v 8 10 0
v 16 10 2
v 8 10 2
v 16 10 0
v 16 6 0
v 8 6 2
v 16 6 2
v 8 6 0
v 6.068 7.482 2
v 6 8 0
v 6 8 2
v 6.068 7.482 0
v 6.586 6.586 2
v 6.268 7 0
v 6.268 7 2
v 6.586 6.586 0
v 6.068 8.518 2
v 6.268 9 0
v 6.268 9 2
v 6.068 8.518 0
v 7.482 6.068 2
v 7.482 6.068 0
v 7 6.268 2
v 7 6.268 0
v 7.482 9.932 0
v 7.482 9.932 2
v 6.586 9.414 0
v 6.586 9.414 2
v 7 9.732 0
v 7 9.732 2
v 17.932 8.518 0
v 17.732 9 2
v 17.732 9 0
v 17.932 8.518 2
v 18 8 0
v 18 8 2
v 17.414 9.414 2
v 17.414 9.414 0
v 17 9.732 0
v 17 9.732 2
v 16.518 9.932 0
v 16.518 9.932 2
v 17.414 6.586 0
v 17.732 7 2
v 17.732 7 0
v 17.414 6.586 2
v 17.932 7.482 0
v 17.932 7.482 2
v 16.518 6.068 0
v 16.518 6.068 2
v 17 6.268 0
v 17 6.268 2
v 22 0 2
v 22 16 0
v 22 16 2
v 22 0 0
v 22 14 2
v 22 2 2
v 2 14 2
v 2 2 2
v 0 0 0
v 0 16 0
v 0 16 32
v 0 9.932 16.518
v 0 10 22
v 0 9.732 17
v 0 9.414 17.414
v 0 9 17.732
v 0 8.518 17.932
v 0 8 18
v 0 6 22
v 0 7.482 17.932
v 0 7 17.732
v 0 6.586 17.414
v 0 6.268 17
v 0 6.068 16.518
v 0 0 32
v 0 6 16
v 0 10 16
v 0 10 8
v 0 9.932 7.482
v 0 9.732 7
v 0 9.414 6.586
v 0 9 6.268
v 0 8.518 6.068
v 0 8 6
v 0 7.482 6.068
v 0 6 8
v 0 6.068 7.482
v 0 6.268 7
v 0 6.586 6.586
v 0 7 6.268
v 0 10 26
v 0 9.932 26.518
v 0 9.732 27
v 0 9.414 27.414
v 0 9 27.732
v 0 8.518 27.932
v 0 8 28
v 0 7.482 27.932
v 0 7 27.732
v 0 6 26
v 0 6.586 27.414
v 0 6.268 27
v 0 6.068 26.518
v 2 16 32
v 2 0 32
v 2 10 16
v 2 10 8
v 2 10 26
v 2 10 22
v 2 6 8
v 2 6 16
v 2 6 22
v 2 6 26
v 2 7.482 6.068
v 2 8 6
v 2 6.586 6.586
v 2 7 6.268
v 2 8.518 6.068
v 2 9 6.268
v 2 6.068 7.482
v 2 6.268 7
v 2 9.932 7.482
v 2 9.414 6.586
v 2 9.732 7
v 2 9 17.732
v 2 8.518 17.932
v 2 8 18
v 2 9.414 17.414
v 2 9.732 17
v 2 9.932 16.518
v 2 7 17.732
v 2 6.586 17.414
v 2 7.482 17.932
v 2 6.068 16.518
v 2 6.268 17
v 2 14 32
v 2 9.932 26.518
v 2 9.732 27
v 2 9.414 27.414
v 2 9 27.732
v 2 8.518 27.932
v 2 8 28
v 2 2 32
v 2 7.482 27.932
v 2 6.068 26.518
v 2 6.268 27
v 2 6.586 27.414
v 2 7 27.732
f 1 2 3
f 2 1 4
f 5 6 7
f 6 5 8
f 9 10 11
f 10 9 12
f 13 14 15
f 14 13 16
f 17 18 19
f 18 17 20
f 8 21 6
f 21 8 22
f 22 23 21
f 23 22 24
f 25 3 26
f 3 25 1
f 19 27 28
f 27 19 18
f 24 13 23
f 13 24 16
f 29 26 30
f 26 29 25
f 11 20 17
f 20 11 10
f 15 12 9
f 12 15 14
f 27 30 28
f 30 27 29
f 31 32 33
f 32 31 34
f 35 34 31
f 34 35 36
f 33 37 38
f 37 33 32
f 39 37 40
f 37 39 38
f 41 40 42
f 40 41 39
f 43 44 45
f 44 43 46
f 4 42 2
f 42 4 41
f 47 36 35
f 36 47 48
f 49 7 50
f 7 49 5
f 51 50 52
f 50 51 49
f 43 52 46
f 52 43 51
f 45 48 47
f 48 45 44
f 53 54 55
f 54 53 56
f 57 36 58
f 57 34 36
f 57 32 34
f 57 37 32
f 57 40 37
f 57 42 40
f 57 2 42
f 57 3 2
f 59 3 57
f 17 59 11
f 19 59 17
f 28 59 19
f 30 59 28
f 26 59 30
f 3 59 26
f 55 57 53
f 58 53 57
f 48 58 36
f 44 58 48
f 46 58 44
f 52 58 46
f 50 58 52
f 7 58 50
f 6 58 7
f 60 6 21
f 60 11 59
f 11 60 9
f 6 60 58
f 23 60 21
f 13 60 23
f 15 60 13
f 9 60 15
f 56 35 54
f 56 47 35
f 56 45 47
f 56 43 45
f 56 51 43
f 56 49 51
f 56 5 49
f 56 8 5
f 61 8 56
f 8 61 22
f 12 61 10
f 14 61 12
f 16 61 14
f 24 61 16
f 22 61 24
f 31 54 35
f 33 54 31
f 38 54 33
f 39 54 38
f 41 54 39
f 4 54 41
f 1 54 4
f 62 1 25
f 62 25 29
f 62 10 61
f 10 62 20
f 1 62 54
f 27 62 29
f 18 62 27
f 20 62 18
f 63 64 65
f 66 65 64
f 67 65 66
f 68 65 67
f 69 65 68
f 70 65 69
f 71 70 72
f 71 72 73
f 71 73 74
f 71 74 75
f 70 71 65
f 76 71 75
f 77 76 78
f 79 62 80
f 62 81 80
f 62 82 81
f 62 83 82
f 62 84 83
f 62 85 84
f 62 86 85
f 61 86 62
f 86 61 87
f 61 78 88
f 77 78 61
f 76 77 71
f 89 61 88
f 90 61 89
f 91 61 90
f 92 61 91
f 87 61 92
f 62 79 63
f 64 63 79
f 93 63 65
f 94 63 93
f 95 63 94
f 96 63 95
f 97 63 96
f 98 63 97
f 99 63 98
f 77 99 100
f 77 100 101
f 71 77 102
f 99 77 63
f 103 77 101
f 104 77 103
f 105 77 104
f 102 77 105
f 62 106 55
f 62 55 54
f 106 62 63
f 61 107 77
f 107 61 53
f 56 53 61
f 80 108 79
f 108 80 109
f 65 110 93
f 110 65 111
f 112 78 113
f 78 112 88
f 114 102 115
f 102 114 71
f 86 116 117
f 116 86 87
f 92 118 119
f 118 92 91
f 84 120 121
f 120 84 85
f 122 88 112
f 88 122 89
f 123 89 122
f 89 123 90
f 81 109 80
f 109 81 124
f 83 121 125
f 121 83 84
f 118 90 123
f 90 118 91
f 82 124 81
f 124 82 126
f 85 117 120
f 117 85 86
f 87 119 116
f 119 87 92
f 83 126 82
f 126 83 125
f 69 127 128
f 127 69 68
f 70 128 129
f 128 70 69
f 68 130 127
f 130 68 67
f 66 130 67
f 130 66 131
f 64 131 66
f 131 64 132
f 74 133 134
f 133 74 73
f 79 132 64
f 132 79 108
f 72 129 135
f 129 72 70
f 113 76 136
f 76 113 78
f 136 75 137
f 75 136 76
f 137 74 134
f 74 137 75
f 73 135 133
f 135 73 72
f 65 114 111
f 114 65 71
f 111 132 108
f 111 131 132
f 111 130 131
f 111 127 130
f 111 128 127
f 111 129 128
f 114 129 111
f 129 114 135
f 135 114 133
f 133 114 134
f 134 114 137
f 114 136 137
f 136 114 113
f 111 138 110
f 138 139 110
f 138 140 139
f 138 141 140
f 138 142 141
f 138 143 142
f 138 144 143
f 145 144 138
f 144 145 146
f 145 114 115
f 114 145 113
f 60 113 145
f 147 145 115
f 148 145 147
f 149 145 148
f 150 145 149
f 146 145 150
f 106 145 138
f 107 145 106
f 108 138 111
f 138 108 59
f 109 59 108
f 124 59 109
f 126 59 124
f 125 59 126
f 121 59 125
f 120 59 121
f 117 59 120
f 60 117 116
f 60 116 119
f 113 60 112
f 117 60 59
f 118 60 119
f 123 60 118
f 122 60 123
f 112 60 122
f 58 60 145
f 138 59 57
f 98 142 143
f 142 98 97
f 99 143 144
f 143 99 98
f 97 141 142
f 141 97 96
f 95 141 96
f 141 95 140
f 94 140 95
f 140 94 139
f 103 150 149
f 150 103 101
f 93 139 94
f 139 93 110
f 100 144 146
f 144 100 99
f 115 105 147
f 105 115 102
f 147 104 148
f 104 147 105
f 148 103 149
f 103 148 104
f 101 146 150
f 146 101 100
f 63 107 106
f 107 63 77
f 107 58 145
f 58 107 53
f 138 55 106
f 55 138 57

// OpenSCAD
// [FL_INDEX: keywords="openscad, 3d_parametric, Parametric_L-Bracket, csg_solid" | COT="Parametric OpenSCAD design from 3DCodeverse"]
// Title: Parametric L-Bracket

// ===== file: l-bracket.scad =====
// l-bracket.scad
//
// generates an l-bracket from the given parameters


// Copyright (c) 2015, Patrick Barrett
// All rights reserved.
//
// Redistribution and use in source and binary forms, with or without
// modification, are permitted provided that the following conditions are met:
//
// 1. Redistributions of source code must retain the above copyright notice,
// this list of conditions and the following disclaimer.
//
// 2. Redistributions in binary form must reproduce the above copyright notice,
// this list of conditions and the following disclaimer in the documentation
// and/or other materials provided with the distribution.
//
// THIS SOFTWARE IS PROVIDED BY THE COPYRIGHT HOLDERS AND CONTRIBUTORS "AS IS"
// AND ANY EXPRESS OR IMPLIED WARRANTIES, INCLUDING, BUT NOT LIMITED TO, THE
// IMPLIED WARRANTIES OF MERCHANTABILITY AND FITNESS FOR A PARTICULAR PURPOSE
// ARE DISCLAIMED. IN NO EVENT SHALL THE COPYRIGHT HOLDER OR CONTRIBUTORS BE
// LIABLE FOR ANY DIRECT, INDIRECT, INCIDENTAL, SPECIAL, EXEMPLARY, OR
// CONSEQUENTIAL DAMAGES (INCLUDING, BUT NOT LIMITED TO, PROCUREMENT OF
// SUBSTITUTE GOODS OR SERVICES; LOSS OF USE, DATA, OR PROFITS; OR BUSINESS
// INTERRUPTION) HOWEVER CAUSED AND ON ANY THEORY OF LIABILITY, WHETHER IN
// CONTRACT, STRICT LIABILITY, OR TORT (INCLUDING NEGLIGENCE OR OTHERWISE)
// ARISING IN ANY WAY OUT OF THE USE OF THIS SOFTWARE, EVEN IF ADVISED OF THE
// POSSIBILITY OF SUCH DAMAGE.

wall_thickness = 2;
internal_width = 12;
slot_width = 4;
side_length = 20;

// customizable variables end here

head_annulus = (internal_width/2) - (slot_width/2);

abit = 0.0001 * 1; //use for making overlap to get single manifold stl

module stadium3d(a, r, z, center = false){
	offset_x = center ? -(r + (a / 2)) : 0;
	offset_y = center ? -(r) : 0;
	offset_z = center ? -(z / 2) : 0;

	translate([offset_x, offset_y, offset_z])
	union() {
		translate([r, 0, 0])
			cube([a, 2*r, z]);
		translate([r, r, 0])
			cylinder(h = z, r = r, center = false);
		translate([r + a, r, 0])
			cylinder(h = z, r = r);
	}
}

union() {
	// horizontal wall
	difference() {
		cube([side_length + wall_thickness,
		      internal_width + 2*wall_thickness,
		      wall_thickness]);
		translate([wall_thickness + head_annulus,
		           wall_thickness + head_annulus,
		           -1])
			stadium3d(side_length - (2*head_annulus) - slot_width,
 			          slot_width / 2,
 			          wall_thickness + 2);
	}

	// verticle wall
	translate([wall_thickness, 0, 0])
	rotate([0,-90,0])
	difference() {
		cube([side_length + wall_thickness,
		      internal_width + 2*wall_thickness,
		      wall_thickness]);
		translate([wall_thickness + head_annulus,
		           wall_thickness + head_annulus,
		           -1])
			stadium3d(side_length - (2*head_annulus) - slot_width,
 			          slot_width / 2,
 			          wall_thickness + 2);
	}

	// bracer 1
	translate([wall_thickness - abit,
	           wall_thickness,
	           wall_thickness - abit])
	rotate([90,0,0])
	linear_extrude(height = wall_thickness) {
		polygon([[0,0],
		        [side_length,0],
		        [0,side_length]]);
	}

	// bracer 2
	translate([wall_thickness - abit,
	           2*wall_thickness + internal_width,
	           wall_thickness - abit])
	rotate([90,0,0])
	linear_extrude(height = wall_thickness) {
		polygon([[0,0],
		        [side_length,0],
		        [0,side_length]]);
	}
}

// ===== file: l-bracket.v1.1.scad =====
//=============================================================================
// l-bracket.scad
//
// generates an l-bracket from the given parameters
//=============================================================================
// CHANGELOG
//
// v1.1 - makes side lengths independant, set $fn
// v1.0 - original release
//=============================================================================
// Written in 2018 by Patrick Barrett
//
// To the extent possible under law, the author(s) have dedicated all copyright
// and related and neighboring rights to this work to the public domain
// worldwide. This work is distributed without any warranty.
//
// See <http://creativecommons.org/publicdomain/zero/1.0/> for full dedication.
//=============================================================================

wall_thickness = 2;
internal_width = 12;
slot_width = 4;
side_length_v = 30;
side_length_h = 20;

// customizable variables end here

head_annulus = (internal_width/2) - (slot_width/2);

abit = 0.0001 * 1; //use for making overlap to get single manifold stl

$fn = 24;

module stadium3d(a, r, z, center = false){
	offset_x = center ? -(r + (a / 2)) : 0;
	offset_y = center ? -(r) : 0;
	offset_z = center ? -(z / 2) : 0;

	translate([offset_x, offset_y, offset_z])
	union() {
		translate([r, 0, 0])
			cube([a, 2*r, z]);
		translate([r, r, 0])
			cylinder(h = z, r = r, center = false);
		translate([r + a, r, 0])
			cylinder(h = z, r = r);
	}
}

union() {
	// horizontal wall
	difference() {
		cube([side_length_h + wall_thickness,
		      internal_width + 2*wall_thickness,
		      wall_thickness]);
		translate([wall_thickness + head_annulus,
		           wall_thickness + head_annulus,
		           -1])
			stadium3d(side_length_h - (2*head_annulus) - slot_width,
 			          slot_width / 2,
 			          wall_thickness + 2);
	}

	// vertiacle wall
	translate([wall_thickness, 0, 0])
	rotate([0,-90,0])
	difference() {
		cube([side_length_v + wall_thickness,
		      internal_width + 2*wall_thickness,
		      wall_thickness]);
		translate([wall_thickness + head_annulus,
		           wall_thickness + head_annulus,
		           -1])
			stadium3d(side_length_v - (2*head_annulus) - slot_width,
 			          slot_width / 2,
 			          wall_thickness + 2);
	}

	// bracer 1
	translate([wall_thickness - abit,
	           wall_thickness,
	           wall_thickness - abit])
	rotate([90,0,0])
	linear_extrude(height = wall_thickness) {
		polygon([[0,0],
		        [side_length_h,0],
		        [0,side_length_v]]);
	}

	// bracer 2
	translate([wall_thickness - abit,
	           2*wall_thickness + internal_width,
	           wall_thickness - abit])
	rotate([90,0,0])
	linear_extrude(height = wall_thickness) {
		polygon([[0,0],
		        [side_length_h,0],
		        [0,side_length_v]]);
	}
}
